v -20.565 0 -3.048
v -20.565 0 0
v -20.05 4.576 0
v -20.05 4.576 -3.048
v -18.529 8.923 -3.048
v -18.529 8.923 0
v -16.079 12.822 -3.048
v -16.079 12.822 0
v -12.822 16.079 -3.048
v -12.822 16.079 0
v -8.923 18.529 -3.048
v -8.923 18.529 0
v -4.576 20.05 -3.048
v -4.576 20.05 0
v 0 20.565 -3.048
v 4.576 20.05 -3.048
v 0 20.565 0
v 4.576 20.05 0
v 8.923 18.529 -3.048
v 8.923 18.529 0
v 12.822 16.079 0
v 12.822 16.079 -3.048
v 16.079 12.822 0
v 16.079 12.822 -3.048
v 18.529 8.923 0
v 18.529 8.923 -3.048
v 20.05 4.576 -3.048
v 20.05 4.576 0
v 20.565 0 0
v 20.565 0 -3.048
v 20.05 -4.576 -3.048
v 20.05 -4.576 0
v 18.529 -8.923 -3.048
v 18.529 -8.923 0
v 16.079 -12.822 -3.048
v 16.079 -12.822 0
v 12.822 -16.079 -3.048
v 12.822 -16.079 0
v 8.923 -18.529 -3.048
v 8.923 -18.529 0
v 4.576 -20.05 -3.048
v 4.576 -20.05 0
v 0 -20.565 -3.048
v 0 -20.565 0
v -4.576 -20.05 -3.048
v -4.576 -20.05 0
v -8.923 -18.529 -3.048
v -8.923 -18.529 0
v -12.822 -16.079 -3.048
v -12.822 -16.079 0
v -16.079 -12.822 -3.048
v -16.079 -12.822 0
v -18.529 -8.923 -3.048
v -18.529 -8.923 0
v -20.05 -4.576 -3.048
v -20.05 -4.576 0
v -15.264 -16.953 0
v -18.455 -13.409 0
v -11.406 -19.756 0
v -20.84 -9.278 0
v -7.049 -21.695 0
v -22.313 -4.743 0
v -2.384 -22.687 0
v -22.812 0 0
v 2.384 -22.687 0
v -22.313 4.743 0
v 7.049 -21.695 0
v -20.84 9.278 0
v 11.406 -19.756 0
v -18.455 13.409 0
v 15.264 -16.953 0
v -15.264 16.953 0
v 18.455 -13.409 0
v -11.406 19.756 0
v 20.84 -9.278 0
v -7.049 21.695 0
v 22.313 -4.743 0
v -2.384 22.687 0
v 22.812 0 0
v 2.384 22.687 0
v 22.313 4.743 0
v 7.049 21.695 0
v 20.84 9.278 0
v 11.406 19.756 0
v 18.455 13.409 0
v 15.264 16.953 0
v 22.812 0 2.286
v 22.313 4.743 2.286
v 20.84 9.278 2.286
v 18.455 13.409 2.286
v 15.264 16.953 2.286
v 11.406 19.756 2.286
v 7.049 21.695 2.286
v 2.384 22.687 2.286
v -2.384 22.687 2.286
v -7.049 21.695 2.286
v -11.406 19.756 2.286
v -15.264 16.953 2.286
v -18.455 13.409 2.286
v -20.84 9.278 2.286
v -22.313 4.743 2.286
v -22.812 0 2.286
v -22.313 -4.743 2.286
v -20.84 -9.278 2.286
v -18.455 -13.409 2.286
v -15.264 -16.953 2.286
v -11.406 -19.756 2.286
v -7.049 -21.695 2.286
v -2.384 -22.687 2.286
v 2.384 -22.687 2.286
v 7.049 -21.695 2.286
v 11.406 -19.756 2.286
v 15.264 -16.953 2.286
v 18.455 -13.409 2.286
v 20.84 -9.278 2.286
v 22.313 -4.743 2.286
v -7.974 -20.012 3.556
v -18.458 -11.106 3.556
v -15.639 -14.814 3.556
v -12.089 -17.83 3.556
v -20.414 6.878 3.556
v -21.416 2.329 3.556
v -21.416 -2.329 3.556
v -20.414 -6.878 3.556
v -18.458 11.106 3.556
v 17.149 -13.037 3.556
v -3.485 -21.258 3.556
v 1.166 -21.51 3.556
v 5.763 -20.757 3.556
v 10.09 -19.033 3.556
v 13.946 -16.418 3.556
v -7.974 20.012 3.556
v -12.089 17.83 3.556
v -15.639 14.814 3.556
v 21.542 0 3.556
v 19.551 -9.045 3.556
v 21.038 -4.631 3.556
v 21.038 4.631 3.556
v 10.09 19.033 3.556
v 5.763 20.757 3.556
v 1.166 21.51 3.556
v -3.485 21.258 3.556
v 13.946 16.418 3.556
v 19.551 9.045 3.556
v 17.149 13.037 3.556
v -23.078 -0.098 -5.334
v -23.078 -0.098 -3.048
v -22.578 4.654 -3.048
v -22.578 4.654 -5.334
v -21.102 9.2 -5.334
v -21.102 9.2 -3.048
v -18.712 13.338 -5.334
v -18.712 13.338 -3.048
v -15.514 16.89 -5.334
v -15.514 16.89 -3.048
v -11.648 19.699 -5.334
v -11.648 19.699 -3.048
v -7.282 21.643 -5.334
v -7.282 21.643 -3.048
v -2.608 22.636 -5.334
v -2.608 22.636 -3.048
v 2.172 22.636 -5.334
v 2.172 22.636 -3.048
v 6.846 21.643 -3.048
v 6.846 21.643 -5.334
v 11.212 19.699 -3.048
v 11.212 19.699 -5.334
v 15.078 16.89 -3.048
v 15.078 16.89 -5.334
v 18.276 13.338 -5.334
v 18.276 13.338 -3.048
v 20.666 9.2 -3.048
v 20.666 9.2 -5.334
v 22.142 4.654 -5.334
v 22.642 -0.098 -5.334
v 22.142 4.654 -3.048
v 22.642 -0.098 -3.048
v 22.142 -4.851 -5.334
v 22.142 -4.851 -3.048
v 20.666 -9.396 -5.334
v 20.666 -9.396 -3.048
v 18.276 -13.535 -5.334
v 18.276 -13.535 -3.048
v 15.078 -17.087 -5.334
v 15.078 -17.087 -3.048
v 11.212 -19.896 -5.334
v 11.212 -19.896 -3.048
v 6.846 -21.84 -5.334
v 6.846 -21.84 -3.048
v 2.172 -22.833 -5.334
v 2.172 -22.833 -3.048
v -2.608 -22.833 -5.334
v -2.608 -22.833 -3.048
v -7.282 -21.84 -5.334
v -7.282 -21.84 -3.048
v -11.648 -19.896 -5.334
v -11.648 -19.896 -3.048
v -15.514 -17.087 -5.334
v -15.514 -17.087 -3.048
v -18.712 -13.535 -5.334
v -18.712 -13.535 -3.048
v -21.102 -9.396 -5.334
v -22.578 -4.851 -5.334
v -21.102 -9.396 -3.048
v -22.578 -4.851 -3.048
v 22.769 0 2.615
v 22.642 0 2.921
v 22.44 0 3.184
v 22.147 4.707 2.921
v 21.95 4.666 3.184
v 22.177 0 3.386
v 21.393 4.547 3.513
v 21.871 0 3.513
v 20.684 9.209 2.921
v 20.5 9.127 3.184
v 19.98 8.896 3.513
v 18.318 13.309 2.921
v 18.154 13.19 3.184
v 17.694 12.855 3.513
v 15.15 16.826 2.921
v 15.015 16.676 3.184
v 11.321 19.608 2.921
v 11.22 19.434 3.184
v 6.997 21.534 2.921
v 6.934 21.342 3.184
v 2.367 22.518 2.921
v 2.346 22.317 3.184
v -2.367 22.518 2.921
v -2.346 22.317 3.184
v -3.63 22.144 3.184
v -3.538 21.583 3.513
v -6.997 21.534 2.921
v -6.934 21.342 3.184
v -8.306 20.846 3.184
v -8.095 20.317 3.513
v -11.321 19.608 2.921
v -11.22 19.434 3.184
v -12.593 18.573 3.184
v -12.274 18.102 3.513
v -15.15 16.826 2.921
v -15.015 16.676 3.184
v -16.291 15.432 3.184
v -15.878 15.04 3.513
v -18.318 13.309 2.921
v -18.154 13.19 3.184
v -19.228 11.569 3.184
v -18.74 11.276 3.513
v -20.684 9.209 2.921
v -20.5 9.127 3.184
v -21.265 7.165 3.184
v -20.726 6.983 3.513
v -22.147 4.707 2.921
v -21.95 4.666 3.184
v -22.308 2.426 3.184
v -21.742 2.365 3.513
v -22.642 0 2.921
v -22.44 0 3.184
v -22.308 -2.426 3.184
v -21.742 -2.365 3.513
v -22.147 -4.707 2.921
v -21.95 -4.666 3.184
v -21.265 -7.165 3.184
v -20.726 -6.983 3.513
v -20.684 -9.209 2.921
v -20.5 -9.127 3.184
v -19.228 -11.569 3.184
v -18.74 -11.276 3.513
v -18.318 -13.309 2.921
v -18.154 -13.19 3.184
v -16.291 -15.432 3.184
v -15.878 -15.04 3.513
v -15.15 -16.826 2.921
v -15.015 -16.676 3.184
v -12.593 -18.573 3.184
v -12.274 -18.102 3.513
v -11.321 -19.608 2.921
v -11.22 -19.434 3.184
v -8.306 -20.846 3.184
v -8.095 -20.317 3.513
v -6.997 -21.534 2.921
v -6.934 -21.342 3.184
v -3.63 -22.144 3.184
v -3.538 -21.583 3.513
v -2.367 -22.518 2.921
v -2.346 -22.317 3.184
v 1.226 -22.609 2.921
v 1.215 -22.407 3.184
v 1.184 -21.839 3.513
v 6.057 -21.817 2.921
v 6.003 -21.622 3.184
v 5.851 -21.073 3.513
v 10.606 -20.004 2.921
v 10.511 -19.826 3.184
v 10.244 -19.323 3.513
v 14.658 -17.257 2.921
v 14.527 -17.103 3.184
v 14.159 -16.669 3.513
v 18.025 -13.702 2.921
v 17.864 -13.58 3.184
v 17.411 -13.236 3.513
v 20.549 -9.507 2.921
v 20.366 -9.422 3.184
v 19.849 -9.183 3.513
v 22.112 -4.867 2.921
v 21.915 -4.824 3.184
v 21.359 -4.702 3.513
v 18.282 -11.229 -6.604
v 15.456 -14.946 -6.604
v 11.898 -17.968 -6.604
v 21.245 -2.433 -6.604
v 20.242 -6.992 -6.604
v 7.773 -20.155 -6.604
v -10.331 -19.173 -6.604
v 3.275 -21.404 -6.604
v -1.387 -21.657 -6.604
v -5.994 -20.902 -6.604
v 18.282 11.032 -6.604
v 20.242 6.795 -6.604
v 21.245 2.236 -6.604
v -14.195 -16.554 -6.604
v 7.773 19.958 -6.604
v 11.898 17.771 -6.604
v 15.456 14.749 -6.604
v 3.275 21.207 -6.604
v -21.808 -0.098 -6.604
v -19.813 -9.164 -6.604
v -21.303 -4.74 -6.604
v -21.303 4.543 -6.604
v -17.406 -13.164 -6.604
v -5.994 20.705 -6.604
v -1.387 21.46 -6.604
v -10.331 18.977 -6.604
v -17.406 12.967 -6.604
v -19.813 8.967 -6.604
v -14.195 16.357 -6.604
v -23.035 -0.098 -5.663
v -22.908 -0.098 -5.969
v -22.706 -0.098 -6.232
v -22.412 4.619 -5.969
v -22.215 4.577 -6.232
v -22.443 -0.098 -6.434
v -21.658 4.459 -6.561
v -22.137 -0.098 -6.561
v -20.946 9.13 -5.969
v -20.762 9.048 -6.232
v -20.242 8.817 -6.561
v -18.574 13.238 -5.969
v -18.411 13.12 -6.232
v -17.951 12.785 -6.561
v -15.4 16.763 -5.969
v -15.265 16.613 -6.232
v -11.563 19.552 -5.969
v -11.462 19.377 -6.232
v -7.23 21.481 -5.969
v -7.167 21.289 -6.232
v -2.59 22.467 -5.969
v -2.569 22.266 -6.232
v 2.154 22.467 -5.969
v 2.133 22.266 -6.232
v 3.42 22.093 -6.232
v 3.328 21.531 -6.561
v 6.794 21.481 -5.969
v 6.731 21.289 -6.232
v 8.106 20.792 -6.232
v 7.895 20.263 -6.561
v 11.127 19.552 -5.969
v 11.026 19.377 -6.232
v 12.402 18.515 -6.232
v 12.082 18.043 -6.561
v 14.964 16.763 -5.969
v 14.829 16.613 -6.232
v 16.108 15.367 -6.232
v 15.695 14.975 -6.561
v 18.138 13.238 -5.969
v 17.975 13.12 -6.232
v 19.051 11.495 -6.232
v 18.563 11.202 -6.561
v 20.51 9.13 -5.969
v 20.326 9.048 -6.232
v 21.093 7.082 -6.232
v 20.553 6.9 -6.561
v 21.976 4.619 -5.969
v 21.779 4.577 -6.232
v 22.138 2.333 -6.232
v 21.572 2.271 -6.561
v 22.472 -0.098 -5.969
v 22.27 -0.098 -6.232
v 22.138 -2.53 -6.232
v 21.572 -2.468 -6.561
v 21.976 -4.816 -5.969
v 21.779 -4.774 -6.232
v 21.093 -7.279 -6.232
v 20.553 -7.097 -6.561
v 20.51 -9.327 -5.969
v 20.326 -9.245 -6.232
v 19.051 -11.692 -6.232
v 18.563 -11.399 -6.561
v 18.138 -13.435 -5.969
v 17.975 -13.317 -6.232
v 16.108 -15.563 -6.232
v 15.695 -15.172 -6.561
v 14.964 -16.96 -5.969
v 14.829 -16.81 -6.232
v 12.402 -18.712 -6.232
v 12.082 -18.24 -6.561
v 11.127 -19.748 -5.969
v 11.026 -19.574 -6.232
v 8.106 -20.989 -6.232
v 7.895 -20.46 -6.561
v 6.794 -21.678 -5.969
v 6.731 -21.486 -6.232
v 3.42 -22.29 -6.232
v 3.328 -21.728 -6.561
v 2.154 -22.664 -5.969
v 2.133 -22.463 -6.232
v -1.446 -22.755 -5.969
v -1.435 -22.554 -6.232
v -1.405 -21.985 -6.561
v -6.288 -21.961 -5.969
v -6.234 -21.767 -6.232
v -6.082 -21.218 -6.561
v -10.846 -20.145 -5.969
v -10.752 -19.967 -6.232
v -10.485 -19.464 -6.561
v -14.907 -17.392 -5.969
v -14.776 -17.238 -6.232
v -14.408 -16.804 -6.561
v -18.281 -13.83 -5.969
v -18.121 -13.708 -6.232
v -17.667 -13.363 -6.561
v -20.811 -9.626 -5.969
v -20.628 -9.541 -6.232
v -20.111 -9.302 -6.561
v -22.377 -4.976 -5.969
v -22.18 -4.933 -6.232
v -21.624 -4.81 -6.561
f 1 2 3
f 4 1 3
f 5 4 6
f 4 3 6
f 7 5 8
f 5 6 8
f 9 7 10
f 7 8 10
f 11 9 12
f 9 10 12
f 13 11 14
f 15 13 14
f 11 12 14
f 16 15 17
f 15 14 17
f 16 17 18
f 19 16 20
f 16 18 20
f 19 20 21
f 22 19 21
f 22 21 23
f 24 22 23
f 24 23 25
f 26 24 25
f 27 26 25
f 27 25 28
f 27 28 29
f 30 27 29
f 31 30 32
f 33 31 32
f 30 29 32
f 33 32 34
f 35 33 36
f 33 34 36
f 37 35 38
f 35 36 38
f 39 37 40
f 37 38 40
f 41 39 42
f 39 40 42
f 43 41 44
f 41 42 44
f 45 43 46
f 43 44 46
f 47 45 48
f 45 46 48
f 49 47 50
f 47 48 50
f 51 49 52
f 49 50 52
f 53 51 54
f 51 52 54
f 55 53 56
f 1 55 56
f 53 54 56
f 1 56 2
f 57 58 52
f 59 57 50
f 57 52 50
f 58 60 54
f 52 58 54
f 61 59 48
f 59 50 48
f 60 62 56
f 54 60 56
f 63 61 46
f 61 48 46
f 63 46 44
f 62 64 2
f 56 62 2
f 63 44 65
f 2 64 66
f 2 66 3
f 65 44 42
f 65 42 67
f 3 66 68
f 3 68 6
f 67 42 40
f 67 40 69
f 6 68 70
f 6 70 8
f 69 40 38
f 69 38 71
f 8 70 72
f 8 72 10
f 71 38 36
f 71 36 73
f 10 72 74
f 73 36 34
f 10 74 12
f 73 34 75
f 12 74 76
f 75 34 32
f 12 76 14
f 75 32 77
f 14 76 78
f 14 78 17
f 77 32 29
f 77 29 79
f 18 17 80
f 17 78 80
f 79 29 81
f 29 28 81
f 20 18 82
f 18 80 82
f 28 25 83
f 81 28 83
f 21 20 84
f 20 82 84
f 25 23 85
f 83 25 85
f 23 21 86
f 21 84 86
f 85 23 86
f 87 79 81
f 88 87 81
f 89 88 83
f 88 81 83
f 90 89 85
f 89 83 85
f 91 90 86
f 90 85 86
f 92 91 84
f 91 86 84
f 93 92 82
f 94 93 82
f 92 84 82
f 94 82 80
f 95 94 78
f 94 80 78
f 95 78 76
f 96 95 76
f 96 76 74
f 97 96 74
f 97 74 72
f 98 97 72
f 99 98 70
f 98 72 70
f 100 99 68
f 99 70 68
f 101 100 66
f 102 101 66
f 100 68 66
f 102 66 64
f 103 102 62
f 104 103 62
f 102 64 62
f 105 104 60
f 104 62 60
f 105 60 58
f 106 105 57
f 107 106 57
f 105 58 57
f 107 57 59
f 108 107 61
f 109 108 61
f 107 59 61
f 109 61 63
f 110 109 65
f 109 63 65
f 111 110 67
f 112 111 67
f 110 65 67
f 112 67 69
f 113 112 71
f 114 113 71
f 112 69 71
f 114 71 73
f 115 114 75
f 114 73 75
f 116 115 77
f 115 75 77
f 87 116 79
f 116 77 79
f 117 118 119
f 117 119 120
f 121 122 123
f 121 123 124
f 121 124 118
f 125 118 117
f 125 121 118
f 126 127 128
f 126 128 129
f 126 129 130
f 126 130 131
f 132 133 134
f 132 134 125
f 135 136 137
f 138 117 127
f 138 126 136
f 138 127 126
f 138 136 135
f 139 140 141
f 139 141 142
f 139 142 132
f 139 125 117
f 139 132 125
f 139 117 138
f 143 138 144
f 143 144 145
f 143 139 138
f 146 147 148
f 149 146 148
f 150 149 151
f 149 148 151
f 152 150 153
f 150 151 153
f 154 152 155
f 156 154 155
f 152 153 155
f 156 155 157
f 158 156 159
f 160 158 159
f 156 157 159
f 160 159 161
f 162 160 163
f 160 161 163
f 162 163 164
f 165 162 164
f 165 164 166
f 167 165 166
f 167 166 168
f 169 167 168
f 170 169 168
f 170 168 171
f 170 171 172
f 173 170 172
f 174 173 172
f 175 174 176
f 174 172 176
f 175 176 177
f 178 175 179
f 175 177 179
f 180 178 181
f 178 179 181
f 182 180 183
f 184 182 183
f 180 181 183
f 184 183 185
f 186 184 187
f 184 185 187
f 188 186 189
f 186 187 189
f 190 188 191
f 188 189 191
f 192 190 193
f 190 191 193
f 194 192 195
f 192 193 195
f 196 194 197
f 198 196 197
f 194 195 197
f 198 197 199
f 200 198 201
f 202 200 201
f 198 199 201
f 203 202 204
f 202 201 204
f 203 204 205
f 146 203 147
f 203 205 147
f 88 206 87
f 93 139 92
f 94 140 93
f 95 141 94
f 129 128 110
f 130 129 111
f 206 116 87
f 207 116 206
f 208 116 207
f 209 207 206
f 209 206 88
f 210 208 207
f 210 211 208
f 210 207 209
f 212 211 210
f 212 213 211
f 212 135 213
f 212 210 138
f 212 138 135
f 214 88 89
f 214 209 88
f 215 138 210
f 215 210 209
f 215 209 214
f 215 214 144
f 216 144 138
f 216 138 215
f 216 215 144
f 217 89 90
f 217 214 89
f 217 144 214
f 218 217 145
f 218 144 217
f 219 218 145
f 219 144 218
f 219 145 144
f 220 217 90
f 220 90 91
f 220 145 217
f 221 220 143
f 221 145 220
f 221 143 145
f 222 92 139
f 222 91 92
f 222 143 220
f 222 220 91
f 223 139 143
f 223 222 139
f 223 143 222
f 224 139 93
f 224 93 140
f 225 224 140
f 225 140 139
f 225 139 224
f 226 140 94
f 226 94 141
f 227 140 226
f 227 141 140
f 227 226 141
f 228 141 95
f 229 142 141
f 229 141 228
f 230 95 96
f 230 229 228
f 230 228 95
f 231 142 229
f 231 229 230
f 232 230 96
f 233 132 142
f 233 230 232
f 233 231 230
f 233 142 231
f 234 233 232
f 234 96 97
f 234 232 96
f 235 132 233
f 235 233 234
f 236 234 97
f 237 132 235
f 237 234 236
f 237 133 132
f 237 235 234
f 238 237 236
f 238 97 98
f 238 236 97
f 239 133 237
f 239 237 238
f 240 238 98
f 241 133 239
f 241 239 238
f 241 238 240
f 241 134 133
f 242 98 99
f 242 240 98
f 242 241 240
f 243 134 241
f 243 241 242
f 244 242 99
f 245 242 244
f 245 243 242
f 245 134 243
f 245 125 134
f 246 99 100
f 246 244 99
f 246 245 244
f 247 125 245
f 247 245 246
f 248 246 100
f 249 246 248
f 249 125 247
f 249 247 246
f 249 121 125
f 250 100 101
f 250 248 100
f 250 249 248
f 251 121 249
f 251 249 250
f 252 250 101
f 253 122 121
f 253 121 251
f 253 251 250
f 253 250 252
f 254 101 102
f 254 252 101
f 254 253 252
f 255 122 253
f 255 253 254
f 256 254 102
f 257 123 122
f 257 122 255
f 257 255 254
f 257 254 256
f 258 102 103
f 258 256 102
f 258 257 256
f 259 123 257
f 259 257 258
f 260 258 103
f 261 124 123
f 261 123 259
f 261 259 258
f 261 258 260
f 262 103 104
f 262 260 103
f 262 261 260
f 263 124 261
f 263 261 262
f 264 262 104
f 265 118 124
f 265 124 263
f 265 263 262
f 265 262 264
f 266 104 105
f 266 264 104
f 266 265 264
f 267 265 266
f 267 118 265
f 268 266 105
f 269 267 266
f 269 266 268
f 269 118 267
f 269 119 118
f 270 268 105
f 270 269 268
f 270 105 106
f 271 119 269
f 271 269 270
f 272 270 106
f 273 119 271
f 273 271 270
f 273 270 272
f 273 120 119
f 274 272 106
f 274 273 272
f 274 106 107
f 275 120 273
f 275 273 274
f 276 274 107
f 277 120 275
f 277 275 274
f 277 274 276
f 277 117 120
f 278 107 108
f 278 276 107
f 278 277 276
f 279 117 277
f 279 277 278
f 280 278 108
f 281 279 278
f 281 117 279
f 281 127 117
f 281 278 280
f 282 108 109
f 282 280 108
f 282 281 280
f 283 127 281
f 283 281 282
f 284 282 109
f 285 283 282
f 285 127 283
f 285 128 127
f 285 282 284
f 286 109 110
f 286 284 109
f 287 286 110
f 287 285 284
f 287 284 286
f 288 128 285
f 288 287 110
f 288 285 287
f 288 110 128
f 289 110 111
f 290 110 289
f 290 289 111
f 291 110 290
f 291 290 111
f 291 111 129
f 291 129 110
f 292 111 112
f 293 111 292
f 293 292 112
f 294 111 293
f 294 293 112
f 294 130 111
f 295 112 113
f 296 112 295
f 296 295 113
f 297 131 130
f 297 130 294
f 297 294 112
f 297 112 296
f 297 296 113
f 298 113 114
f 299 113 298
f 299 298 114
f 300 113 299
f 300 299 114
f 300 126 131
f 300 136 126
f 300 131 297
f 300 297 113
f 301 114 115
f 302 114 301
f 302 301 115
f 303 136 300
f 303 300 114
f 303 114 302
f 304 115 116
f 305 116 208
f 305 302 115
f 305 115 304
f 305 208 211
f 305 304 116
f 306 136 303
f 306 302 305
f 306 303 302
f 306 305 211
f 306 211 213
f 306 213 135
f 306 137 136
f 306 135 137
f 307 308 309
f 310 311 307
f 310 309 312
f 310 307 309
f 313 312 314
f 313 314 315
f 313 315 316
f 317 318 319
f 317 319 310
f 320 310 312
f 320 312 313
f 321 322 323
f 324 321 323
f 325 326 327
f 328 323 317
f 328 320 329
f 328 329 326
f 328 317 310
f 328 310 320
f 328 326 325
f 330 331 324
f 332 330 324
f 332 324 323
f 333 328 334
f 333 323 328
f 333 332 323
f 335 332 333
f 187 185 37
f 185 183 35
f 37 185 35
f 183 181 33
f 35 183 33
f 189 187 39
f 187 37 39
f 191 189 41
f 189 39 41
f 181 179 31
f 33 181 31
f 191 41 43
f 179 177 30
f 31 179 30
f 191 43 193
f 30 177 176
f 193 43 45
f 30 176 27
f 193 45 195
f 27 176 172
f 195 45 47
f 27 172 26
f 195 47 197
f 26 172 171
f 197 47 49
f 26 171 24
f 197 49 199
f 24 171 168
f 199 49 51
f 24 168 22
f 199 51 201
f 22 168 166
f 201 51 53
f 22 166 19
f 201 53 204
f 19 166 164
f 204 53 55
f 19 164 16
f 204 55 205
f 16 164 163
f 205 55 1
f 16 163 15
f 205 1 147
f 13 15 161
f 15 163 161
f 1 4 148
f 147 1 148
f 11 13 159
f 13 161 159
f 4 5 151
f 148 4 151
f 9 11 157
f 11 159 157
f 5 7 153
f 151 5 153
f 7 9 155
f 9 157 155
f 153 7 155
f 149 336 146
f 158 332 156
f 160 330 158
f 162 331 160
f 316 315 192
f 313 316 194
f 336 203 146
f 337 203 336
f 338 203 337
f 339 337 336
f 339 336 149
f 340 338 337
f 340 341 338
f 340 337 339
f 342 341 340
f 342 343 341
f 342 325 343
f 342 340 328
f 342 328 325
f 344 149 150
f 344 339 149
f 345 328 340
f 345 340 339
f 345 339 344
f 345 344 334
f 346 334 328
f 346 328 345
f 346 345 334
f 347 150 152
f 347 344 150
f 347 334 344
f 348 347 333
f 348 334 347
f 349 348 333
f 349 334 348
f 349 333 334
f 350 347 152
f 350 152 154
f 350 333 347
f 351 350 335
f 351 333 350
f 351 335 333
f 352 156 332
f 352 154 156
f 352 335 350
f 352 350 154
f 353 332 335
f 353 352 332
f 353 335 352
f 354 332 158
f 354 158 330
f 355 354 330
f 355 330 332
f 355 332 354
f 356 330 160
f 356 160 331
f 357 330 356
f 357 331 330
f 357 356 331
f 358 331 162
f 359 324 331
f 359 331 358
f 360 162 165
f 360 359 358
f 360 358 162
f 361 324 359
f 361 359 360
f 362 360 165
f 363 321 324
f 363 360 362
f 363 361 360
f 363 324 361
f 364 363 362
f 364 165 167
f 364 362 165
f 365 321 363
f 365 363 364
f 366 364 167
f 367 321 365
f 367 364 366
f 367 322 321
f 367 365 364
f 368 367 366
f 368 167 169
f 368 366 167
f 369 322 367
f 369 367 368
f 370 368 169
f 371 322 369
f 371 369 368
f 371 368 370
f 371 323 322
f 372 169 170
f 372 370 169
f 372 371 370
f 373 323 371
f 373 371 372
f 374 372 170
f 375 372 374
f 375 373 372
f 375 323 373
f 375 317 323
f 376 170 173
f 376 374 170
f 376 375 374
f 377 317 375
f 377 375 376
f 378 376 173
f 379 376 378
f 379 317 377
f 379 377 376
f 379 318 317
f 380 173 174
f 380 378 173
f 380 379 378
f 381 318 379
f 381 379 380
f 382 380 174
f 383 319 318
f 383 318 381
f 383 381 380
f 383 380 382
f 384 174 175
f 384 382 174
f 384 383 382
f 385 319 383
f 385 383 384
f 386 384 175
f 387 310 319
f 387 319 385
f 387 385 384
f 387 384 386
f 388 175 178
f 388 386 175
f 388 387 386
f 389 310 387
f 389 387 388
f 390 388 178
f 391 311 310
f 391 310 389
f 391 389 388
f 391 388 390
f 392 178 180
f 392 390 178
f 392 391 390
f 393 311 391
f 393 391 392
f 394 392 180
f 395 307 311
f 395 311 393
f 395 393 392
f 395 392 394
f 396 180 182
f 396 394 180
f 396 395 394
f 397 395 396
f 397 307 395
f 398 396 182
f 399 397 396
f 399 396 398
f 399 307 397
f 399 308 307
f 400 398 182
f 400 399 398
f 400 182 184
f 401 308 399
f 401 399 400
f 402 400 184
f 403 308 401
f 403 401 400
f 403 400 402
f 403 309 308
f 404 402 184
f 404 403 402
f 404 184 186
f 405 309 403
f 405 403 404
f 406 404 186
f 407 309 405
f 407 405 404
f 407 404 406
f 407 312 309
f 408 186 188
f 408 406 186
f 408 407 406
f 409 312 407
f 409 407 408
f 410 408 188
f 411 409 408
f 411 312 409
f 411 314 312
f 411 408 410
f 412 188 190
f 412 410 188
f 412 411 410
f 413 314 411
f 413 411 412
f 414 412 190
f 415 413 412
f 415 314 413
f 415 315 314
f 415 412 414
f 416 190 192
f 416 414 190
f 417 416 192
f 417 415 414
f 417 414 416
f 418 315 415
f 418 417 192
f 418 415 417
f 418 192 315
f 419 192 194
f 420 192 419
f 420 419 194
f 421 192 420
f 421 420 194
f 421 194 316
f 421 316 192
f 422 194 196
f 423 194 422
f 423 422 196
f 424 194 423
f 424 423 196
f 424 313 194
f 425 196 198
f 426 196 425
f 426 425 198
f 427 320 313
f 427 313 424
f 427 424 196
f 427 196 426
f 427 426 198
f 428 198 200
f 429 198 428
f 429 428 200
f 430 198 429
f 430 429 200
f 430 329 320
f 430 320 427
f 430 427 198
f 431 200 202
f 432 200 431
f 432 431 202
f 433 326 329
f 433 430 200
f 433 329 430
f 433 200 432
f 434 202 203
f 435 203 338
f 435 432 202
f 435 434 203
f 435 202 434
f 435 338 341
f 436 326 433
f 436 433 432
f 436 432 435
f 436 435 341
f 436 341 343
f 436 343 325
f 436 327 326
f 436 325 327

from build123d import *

# Parameters (mm, degrees)
SKETCH1_R           = 22.811957467
BOSS_EXTRUDE1_DEPTH = 3.556
SKETCH2_R           = 20.565315444
BOSS_EXTRUDE2_DEPTH = 3.048
SKETCH3_R           = 22.86
BOSS_EXTRUDE3_DEPTH = 3.556
FILLET2_R           = 1.27
FILLET3_R           = 1.27


with BuildPart() as part:
    # Sketch1 → Boss-Extrude1 (new body)
    with BuildSketch(Plane.XY):
        Circle(SKETCH1_R)
    extrude(amount=BOSS_EXTRUDE1_DEPTH)

    # Sketch2 → Boss-Extrude2 (add)
    with BuildSketch(Plane(origin=(0, 0, 0), x_dir=(-1, 0, 0), z_dir=(0, 0, -1))):
        Circle(SKETCH2_R)
    extrude(amount=BOSS_EXTRUDE2_DEPTH)

    # Sketch3 → Boss-Extrude3 (add)
    with BuildSketch(Plane(origin=(-3.118678077, -2.889960947, -3.048), x_dir=(-1, 0, 0), z_dir=(0, 0, -1))):
        with Locations((-2.900665776, 2.79149385)):
            Circle(SKETCH3_R)
    extrude(amount=BOSS_EXTRUDE3_DEPTH)

    # Fillet2
    fillet2_edges = [part.edges().sort_by_distance(p)[0] for p in [
        (-22.811957467, 0, 3.556),
    ]]
    fillet(fillet2_edges, radius=FILLET2_R)

    # Fillet3
    fillet3_edges = [part.edges().sort_by_distance(p)[0] for p in [
        (22.641987699, -0.098467097, -6.604),
    ]]
    fillet(fillet3_edges, radius=FILLET3_R)


solid = part.part
